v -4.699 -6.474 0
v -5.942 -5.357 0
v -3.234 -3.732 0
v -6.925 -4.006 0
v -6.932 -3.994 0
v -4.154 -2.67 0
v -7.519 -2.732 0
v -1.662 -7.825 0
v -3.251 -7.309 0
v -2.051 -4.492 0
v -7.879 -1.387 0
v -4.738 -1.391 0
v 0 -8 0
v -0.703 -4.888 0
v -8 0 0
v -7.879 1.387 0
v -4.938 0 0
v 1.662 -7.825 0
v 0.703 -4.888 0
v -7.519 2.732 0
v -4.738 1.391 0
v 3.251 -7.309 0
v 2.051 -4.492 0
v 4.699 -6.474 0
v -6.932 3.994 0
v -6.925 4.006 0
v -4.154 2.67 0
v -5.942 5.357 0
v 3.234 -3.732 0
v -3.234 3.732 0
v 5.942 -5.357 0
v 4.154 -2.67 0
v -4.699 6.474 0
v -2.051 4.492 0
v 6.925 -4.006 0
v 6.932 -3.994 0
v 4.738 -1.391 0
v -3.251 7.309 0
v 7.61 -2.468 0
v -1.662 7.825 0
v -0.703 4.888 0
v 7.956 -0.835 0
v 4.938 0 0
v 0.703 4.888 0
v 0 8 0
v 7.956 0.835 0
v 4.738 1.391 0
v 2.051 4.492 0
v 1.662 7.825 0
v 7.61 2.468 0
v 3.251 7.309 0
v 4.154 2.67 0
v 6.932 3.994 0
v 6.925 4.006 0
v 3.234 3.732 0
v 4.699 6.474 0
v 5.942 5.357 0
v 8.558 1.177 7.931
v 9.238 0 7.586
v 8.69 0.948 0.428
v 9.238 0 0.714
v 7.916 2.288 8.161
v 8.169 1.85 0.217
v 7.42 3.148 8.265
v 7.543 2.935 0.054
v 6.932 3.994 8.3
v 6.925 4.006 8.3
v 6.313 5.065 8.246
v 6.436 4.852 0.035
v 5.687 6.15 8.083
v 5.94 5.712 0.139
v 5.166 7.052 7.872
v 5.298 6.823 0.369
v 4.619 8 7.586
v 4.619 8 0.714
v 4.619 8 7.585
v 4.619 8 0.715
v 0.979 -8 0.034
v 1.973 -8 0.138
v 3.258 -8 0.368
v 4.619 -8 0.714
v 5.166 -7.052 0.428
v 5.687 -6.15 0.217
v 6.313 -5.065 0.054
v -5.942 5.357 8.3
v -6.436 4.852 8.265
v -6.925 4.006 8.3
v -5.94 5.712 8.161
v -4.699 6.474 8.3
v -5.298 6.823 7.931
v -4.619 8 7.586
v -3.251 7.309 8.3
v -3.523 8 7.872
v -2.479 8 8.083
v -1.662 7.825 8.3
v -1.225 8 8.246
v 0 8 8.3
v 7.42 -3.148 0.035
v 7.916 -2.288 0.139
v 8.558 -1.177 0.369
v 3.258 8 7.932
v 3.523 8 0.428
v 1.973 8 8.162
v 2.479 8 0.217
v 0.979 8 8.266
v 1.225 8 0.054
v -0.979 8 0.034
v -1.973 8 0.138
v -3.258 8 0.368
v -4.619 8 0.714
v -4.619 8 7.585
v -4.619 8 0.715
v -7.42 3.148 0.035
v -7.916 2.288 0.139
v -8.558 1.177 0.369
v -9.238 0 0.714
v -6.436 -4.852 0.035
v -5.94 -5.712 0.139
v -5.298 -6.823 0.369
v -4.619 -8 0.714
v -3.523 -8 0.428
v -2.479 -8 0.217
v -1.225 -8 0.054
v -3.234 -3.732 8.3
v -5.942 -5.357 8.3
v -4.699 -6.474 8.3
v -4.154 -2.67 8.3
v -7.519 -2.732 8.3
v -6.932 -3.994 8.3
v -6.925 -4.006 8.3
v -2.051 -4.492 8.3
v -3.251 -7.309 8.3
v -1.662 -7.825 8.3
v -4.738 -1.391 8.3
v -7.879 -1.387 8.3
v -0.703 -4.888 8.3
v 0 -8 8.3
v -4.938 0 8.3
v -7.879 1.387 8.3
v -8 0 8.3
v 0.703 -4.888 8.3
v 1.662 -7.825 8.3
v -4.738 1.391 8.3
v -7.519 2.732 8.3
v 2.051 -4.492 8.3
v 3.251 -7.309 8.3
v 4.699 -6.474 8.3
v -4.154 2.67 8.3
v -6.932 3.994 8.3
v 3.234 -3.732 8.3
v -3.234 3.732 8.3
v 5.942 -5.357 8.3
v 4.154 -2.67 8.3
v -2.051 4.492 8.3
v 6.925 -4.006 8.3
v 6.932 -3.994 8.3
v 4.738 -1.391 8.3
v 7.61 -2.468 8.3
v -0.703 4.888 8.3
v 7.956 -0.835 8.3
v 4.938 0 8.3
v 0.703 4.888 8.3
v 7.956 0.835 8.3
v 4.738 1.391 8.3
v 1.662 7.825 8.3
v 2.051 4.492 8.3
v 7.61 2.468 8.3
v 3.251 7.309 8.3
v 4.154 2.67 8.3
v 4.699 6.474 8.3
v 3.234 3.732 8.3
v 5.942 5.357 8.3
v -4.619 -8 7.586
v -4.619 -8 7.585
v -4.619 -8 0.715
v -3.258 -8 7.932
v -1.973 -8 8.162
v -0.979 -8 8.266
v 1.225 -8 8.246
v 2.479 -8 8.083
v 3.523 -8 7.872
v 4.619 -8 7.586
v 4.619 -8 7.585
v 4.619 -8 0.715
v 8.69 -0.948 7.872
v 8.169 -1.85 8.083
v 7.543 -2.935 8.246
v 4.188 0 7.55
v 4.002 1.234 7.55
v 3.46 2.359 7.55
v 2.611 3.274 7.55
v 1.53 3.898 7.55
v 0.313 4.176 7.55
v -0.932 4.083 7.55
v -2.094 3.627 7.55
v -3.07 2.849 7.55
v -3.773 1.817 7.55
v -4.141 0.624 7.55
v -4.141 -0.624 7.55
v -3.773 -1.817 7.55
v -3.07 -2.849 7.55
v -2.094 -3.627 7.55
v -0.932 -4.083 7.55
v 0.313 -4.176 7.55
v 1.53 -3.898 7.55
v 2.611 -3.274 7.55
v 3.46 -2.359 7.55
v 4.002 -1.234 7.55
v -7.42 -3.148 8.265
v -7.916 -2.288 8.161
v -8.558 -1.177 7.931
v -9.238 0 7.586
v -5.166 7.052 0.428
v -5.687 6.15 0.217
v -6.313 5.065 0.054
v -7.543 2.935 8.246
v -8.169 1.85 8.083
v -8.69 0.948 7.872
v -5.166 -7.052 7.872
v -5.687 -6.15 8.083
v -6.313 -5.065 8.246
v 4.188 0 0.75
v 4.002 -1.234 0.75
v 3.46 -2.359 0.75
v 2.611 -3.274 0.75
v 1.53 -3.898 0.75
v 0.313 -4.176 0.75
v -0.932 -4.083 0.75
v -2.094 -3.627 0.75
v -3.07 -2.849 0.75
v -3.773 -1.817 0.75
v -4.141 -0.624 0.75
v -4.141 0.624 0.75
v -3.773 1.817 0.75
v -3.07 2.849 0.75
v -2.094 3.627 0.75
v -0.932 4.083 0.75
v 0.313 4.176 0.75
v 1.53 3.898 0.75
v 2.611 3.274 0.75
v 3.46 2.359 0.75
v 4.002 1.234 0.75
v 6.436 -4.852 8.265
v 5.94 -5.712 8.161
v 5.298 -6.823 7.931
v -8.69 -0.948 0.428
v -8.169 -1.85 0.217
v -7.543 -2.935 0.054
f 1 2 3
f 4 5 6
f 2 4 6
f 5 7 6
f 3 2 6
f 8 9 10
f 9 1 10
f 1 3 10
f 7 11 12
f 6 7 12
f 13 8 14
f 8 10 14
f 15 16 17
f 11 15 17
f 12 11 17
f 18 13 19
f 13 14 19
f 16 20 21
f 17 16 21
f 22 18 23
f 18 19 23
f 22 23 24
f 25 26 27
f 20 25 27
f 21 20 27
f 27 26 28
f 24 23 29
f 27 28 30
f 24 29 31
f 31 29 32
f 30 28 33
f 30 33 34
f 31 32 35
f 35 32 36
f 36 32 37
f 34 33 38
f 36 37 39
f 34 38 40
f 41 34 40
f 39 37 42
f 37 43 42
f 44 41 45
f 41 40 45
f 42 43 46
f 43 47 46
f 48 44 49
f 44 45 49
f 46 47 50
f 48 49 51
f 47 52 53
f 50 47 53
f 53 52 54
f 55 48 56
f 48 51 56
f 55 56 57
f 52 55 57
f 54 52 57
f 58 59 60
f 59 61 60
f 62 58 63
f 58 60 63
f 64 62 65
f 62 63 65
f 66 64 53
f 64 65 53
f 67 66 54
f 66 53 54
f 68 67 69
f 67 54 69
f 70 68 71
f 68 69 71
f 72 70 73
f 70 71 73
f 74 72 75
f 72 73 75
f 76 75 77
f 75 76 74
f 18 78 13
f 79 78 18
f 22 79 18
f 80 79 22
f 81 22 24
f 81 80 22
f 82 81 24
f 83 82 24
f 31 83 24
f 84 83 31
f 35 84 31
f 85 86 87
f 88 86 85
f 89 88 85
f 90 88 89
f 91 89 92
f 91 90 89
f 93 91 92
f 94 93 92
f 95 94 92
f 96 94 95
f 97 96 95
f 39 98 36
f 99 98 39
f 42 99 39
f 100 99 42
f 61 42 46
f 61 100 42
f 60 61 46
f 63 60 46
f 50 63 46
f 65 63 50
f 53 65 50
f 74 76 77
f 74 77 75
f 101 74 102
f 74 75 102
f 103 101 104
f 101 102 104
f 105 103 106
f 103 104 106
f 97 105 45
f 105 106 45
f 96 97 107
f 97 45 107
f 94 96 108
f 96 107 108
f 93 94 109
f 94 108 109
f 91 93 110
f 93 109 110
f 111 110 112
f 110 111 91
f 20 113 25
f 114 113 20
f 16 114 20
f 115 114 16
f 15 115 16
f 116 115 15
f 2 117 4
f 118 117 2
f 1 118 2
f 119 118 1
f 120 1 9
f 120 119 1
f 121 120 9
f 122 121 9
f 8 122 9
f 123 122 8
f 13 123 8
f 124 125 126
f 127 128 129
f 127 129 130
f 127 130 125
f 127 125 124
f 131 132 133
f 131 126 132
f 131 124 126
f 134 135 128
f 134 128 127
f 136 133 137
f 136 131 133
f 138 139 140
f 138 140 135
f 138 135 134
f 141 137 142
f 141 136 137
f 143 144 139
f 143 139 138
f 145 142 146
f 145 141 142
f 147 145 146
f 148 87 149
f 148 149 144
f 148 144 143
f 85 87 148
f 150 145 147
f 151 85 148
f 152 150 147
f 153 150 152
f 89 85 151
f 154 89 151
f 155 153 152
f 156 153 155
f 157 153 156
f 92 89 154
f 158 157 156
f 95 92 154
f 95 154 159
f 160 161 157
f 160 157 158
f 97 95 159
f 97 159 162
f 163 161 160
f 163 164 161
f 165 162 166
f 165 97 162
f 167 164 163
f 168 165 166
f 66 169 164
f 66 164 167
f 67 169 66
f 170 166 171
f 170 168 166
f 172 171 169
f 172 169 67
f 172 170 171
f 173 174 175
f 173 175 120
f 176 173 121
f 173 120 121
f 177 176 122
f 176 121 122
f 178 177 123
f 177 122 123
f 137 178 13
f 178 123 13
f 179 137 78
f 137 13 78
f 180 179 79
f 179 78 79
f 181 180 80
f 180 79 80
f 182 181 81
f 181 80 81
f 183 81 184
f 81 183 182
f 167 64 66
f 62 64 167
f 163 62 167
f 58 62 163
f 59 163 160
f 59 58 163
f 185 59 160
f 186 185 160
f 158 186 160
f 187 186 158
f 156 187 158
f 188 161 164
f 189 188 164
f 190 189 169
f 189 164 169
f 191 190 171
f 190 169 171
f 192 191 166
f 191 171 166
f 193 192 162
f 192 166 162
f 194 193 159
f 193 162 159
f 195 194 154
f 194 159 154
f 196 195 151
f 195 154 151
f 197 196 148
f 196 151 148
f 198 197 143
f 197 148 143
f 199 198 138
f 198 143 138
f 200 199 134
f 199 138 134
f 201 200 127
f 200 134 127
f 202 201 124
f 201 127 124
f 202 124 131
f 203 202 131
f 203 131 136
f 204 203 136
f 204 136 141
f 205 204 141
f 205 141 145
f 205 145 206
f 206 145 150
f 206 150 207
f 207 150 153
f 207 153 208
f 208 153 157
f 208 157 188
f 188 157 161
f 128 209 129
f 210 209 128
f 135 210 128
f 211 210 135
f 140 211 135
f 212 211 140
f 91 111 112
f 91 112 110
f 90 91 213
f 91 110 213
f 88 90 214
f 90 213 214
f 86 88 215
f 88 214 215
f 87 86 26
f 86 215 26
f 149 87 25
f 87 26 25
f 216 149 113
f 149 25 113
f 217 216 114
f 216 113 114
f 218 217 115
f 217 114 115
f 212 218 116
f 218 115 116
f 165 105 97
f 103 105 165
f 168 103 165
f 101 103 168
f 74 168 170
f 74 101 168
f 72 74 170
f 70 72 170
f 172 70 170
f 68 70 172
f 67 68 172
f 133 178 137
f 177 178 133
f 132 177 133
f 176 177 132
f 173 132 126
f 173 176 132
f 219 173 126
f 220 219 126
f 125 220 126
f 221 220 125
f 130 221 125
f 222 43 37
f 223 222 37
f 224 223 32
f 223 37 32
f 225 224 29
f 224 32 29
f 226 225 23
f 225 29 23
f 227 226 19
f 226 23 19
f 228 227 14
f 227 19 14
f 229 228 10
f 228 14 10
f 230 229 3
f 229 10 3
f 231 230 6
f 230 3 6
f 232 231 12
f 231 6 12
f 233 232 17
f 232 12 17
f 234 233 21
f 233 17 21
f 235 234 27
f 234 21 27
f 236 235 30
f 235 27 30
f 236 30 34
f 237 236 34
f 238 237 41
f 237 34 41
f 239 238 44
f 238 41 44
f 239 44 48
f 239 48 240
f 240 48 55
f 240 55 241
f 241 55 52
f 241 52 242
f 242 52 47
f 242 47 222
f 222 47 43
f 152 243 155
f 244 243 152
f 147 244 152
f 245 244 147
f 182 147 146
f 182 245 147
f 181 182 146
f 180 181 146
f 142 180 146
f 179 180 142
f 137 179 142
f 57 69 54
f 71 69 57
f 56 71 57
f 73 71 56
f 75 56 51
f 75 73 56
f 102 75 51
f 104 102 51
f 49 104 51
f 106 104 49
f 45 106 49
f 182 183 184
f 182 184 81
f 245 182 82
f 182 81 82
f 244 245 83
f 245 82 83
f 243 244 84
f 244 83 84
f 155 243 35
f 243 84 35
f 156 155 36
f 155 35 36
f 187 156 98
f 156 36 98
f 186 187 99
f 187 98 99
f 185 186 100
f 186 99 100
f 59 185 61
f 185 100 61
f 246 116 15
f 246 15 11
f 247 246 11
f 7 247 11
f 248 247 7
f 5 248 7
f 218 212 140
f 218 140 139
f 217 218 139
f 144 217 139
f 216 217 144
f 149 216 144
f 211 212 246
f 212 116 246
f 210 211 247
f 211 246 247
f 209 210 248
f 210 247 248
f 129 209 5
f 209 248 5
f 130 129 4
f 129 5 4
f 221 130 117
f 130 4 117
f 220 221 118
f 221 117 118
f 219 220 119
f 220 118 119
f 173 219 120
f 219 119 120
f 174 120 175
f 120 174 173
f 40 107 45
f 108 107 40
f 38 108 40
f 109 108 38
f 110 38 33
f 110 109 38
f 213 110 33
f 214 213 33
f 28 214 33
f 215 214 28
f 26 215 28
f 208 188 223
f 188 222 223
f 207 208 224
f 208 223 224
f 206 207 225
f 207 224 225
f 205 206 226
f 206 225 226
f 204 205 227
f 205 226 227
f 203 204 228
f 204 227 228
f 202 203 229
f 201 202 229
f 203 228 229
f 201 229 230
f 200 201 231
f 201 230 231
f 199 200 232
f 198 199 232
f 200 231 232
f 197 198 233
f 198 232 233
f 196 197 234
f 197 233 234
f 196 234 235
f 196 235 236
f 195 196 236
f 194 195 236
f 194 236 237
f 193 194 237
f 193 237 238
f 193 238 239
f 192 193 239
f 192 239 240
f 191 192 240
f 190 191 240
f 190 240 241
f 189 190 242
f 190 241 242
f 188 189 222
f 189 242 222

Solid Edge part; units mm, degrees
sketch "Sketch1" plane through (0, 0, 0) normal (0, 0, 1) x (1, 0, 0)
  line L0 (-4.6188, -8) -> (4.6188, -8)
  line L1 (4.6188, -8) -> (9.2376, 0)
  line L2 (9.2376, 0) -> (4.6188, 8)
  line L3 (4.6188, 8) -> (-4.6188, 8)
  line L4 (-4.6188, 8) -> (-9.2376, 0)
  line L5 (-9.2376, 0) -> (-4.6188, -8)
  dimension "D1" = 16
  dimension "D2" = 16
extrude "Protrusion1" add sketch "Sketch1" along normal blind 8.3
sketch "Sketch2" plane through (0, 0, 0) normal (0, -1, 0) x (1, 0, 0)
  line L0 (-8, 8.3) -> (-9.2376, 7.5855)
revolve "RevolvedCutout1" cut sketch "Sketch2" angle 360 about axis through (0, 0, 57.15) along (0, 0, -1) material side at (-8.6438, 0, 7.9861)
sketch "Sketch3" plane through (0, 0, 0) normal (0, -1, 0) x (1, 0, 0)
  line L0 (-8, 0) -> (-9.2376, 0.7145)
revolve "RevolvedCutout2" cut sketch "Sketch3" angle 360 about axis through (0, 0, 57.15) along (0, 0, -1) material side at (-8.6438, 0, 0.3139)
sketch "Sketch4" plane through (0, 0, 0) normal (0, 0, 1) x (1, 0, 0)
  circle A0 centre (0, 0) radius 4.188
extrude "Cutout1" cut sketch "Sketch4" along normal through all and the other way through all
chamfer "Chamfer1" distance 0.75 angle 45 2 edges at (-4.188, 0, 8.3) (-4.188, 0, 0)
cosmetic_thread "Thread1"
properties material "Steel"
